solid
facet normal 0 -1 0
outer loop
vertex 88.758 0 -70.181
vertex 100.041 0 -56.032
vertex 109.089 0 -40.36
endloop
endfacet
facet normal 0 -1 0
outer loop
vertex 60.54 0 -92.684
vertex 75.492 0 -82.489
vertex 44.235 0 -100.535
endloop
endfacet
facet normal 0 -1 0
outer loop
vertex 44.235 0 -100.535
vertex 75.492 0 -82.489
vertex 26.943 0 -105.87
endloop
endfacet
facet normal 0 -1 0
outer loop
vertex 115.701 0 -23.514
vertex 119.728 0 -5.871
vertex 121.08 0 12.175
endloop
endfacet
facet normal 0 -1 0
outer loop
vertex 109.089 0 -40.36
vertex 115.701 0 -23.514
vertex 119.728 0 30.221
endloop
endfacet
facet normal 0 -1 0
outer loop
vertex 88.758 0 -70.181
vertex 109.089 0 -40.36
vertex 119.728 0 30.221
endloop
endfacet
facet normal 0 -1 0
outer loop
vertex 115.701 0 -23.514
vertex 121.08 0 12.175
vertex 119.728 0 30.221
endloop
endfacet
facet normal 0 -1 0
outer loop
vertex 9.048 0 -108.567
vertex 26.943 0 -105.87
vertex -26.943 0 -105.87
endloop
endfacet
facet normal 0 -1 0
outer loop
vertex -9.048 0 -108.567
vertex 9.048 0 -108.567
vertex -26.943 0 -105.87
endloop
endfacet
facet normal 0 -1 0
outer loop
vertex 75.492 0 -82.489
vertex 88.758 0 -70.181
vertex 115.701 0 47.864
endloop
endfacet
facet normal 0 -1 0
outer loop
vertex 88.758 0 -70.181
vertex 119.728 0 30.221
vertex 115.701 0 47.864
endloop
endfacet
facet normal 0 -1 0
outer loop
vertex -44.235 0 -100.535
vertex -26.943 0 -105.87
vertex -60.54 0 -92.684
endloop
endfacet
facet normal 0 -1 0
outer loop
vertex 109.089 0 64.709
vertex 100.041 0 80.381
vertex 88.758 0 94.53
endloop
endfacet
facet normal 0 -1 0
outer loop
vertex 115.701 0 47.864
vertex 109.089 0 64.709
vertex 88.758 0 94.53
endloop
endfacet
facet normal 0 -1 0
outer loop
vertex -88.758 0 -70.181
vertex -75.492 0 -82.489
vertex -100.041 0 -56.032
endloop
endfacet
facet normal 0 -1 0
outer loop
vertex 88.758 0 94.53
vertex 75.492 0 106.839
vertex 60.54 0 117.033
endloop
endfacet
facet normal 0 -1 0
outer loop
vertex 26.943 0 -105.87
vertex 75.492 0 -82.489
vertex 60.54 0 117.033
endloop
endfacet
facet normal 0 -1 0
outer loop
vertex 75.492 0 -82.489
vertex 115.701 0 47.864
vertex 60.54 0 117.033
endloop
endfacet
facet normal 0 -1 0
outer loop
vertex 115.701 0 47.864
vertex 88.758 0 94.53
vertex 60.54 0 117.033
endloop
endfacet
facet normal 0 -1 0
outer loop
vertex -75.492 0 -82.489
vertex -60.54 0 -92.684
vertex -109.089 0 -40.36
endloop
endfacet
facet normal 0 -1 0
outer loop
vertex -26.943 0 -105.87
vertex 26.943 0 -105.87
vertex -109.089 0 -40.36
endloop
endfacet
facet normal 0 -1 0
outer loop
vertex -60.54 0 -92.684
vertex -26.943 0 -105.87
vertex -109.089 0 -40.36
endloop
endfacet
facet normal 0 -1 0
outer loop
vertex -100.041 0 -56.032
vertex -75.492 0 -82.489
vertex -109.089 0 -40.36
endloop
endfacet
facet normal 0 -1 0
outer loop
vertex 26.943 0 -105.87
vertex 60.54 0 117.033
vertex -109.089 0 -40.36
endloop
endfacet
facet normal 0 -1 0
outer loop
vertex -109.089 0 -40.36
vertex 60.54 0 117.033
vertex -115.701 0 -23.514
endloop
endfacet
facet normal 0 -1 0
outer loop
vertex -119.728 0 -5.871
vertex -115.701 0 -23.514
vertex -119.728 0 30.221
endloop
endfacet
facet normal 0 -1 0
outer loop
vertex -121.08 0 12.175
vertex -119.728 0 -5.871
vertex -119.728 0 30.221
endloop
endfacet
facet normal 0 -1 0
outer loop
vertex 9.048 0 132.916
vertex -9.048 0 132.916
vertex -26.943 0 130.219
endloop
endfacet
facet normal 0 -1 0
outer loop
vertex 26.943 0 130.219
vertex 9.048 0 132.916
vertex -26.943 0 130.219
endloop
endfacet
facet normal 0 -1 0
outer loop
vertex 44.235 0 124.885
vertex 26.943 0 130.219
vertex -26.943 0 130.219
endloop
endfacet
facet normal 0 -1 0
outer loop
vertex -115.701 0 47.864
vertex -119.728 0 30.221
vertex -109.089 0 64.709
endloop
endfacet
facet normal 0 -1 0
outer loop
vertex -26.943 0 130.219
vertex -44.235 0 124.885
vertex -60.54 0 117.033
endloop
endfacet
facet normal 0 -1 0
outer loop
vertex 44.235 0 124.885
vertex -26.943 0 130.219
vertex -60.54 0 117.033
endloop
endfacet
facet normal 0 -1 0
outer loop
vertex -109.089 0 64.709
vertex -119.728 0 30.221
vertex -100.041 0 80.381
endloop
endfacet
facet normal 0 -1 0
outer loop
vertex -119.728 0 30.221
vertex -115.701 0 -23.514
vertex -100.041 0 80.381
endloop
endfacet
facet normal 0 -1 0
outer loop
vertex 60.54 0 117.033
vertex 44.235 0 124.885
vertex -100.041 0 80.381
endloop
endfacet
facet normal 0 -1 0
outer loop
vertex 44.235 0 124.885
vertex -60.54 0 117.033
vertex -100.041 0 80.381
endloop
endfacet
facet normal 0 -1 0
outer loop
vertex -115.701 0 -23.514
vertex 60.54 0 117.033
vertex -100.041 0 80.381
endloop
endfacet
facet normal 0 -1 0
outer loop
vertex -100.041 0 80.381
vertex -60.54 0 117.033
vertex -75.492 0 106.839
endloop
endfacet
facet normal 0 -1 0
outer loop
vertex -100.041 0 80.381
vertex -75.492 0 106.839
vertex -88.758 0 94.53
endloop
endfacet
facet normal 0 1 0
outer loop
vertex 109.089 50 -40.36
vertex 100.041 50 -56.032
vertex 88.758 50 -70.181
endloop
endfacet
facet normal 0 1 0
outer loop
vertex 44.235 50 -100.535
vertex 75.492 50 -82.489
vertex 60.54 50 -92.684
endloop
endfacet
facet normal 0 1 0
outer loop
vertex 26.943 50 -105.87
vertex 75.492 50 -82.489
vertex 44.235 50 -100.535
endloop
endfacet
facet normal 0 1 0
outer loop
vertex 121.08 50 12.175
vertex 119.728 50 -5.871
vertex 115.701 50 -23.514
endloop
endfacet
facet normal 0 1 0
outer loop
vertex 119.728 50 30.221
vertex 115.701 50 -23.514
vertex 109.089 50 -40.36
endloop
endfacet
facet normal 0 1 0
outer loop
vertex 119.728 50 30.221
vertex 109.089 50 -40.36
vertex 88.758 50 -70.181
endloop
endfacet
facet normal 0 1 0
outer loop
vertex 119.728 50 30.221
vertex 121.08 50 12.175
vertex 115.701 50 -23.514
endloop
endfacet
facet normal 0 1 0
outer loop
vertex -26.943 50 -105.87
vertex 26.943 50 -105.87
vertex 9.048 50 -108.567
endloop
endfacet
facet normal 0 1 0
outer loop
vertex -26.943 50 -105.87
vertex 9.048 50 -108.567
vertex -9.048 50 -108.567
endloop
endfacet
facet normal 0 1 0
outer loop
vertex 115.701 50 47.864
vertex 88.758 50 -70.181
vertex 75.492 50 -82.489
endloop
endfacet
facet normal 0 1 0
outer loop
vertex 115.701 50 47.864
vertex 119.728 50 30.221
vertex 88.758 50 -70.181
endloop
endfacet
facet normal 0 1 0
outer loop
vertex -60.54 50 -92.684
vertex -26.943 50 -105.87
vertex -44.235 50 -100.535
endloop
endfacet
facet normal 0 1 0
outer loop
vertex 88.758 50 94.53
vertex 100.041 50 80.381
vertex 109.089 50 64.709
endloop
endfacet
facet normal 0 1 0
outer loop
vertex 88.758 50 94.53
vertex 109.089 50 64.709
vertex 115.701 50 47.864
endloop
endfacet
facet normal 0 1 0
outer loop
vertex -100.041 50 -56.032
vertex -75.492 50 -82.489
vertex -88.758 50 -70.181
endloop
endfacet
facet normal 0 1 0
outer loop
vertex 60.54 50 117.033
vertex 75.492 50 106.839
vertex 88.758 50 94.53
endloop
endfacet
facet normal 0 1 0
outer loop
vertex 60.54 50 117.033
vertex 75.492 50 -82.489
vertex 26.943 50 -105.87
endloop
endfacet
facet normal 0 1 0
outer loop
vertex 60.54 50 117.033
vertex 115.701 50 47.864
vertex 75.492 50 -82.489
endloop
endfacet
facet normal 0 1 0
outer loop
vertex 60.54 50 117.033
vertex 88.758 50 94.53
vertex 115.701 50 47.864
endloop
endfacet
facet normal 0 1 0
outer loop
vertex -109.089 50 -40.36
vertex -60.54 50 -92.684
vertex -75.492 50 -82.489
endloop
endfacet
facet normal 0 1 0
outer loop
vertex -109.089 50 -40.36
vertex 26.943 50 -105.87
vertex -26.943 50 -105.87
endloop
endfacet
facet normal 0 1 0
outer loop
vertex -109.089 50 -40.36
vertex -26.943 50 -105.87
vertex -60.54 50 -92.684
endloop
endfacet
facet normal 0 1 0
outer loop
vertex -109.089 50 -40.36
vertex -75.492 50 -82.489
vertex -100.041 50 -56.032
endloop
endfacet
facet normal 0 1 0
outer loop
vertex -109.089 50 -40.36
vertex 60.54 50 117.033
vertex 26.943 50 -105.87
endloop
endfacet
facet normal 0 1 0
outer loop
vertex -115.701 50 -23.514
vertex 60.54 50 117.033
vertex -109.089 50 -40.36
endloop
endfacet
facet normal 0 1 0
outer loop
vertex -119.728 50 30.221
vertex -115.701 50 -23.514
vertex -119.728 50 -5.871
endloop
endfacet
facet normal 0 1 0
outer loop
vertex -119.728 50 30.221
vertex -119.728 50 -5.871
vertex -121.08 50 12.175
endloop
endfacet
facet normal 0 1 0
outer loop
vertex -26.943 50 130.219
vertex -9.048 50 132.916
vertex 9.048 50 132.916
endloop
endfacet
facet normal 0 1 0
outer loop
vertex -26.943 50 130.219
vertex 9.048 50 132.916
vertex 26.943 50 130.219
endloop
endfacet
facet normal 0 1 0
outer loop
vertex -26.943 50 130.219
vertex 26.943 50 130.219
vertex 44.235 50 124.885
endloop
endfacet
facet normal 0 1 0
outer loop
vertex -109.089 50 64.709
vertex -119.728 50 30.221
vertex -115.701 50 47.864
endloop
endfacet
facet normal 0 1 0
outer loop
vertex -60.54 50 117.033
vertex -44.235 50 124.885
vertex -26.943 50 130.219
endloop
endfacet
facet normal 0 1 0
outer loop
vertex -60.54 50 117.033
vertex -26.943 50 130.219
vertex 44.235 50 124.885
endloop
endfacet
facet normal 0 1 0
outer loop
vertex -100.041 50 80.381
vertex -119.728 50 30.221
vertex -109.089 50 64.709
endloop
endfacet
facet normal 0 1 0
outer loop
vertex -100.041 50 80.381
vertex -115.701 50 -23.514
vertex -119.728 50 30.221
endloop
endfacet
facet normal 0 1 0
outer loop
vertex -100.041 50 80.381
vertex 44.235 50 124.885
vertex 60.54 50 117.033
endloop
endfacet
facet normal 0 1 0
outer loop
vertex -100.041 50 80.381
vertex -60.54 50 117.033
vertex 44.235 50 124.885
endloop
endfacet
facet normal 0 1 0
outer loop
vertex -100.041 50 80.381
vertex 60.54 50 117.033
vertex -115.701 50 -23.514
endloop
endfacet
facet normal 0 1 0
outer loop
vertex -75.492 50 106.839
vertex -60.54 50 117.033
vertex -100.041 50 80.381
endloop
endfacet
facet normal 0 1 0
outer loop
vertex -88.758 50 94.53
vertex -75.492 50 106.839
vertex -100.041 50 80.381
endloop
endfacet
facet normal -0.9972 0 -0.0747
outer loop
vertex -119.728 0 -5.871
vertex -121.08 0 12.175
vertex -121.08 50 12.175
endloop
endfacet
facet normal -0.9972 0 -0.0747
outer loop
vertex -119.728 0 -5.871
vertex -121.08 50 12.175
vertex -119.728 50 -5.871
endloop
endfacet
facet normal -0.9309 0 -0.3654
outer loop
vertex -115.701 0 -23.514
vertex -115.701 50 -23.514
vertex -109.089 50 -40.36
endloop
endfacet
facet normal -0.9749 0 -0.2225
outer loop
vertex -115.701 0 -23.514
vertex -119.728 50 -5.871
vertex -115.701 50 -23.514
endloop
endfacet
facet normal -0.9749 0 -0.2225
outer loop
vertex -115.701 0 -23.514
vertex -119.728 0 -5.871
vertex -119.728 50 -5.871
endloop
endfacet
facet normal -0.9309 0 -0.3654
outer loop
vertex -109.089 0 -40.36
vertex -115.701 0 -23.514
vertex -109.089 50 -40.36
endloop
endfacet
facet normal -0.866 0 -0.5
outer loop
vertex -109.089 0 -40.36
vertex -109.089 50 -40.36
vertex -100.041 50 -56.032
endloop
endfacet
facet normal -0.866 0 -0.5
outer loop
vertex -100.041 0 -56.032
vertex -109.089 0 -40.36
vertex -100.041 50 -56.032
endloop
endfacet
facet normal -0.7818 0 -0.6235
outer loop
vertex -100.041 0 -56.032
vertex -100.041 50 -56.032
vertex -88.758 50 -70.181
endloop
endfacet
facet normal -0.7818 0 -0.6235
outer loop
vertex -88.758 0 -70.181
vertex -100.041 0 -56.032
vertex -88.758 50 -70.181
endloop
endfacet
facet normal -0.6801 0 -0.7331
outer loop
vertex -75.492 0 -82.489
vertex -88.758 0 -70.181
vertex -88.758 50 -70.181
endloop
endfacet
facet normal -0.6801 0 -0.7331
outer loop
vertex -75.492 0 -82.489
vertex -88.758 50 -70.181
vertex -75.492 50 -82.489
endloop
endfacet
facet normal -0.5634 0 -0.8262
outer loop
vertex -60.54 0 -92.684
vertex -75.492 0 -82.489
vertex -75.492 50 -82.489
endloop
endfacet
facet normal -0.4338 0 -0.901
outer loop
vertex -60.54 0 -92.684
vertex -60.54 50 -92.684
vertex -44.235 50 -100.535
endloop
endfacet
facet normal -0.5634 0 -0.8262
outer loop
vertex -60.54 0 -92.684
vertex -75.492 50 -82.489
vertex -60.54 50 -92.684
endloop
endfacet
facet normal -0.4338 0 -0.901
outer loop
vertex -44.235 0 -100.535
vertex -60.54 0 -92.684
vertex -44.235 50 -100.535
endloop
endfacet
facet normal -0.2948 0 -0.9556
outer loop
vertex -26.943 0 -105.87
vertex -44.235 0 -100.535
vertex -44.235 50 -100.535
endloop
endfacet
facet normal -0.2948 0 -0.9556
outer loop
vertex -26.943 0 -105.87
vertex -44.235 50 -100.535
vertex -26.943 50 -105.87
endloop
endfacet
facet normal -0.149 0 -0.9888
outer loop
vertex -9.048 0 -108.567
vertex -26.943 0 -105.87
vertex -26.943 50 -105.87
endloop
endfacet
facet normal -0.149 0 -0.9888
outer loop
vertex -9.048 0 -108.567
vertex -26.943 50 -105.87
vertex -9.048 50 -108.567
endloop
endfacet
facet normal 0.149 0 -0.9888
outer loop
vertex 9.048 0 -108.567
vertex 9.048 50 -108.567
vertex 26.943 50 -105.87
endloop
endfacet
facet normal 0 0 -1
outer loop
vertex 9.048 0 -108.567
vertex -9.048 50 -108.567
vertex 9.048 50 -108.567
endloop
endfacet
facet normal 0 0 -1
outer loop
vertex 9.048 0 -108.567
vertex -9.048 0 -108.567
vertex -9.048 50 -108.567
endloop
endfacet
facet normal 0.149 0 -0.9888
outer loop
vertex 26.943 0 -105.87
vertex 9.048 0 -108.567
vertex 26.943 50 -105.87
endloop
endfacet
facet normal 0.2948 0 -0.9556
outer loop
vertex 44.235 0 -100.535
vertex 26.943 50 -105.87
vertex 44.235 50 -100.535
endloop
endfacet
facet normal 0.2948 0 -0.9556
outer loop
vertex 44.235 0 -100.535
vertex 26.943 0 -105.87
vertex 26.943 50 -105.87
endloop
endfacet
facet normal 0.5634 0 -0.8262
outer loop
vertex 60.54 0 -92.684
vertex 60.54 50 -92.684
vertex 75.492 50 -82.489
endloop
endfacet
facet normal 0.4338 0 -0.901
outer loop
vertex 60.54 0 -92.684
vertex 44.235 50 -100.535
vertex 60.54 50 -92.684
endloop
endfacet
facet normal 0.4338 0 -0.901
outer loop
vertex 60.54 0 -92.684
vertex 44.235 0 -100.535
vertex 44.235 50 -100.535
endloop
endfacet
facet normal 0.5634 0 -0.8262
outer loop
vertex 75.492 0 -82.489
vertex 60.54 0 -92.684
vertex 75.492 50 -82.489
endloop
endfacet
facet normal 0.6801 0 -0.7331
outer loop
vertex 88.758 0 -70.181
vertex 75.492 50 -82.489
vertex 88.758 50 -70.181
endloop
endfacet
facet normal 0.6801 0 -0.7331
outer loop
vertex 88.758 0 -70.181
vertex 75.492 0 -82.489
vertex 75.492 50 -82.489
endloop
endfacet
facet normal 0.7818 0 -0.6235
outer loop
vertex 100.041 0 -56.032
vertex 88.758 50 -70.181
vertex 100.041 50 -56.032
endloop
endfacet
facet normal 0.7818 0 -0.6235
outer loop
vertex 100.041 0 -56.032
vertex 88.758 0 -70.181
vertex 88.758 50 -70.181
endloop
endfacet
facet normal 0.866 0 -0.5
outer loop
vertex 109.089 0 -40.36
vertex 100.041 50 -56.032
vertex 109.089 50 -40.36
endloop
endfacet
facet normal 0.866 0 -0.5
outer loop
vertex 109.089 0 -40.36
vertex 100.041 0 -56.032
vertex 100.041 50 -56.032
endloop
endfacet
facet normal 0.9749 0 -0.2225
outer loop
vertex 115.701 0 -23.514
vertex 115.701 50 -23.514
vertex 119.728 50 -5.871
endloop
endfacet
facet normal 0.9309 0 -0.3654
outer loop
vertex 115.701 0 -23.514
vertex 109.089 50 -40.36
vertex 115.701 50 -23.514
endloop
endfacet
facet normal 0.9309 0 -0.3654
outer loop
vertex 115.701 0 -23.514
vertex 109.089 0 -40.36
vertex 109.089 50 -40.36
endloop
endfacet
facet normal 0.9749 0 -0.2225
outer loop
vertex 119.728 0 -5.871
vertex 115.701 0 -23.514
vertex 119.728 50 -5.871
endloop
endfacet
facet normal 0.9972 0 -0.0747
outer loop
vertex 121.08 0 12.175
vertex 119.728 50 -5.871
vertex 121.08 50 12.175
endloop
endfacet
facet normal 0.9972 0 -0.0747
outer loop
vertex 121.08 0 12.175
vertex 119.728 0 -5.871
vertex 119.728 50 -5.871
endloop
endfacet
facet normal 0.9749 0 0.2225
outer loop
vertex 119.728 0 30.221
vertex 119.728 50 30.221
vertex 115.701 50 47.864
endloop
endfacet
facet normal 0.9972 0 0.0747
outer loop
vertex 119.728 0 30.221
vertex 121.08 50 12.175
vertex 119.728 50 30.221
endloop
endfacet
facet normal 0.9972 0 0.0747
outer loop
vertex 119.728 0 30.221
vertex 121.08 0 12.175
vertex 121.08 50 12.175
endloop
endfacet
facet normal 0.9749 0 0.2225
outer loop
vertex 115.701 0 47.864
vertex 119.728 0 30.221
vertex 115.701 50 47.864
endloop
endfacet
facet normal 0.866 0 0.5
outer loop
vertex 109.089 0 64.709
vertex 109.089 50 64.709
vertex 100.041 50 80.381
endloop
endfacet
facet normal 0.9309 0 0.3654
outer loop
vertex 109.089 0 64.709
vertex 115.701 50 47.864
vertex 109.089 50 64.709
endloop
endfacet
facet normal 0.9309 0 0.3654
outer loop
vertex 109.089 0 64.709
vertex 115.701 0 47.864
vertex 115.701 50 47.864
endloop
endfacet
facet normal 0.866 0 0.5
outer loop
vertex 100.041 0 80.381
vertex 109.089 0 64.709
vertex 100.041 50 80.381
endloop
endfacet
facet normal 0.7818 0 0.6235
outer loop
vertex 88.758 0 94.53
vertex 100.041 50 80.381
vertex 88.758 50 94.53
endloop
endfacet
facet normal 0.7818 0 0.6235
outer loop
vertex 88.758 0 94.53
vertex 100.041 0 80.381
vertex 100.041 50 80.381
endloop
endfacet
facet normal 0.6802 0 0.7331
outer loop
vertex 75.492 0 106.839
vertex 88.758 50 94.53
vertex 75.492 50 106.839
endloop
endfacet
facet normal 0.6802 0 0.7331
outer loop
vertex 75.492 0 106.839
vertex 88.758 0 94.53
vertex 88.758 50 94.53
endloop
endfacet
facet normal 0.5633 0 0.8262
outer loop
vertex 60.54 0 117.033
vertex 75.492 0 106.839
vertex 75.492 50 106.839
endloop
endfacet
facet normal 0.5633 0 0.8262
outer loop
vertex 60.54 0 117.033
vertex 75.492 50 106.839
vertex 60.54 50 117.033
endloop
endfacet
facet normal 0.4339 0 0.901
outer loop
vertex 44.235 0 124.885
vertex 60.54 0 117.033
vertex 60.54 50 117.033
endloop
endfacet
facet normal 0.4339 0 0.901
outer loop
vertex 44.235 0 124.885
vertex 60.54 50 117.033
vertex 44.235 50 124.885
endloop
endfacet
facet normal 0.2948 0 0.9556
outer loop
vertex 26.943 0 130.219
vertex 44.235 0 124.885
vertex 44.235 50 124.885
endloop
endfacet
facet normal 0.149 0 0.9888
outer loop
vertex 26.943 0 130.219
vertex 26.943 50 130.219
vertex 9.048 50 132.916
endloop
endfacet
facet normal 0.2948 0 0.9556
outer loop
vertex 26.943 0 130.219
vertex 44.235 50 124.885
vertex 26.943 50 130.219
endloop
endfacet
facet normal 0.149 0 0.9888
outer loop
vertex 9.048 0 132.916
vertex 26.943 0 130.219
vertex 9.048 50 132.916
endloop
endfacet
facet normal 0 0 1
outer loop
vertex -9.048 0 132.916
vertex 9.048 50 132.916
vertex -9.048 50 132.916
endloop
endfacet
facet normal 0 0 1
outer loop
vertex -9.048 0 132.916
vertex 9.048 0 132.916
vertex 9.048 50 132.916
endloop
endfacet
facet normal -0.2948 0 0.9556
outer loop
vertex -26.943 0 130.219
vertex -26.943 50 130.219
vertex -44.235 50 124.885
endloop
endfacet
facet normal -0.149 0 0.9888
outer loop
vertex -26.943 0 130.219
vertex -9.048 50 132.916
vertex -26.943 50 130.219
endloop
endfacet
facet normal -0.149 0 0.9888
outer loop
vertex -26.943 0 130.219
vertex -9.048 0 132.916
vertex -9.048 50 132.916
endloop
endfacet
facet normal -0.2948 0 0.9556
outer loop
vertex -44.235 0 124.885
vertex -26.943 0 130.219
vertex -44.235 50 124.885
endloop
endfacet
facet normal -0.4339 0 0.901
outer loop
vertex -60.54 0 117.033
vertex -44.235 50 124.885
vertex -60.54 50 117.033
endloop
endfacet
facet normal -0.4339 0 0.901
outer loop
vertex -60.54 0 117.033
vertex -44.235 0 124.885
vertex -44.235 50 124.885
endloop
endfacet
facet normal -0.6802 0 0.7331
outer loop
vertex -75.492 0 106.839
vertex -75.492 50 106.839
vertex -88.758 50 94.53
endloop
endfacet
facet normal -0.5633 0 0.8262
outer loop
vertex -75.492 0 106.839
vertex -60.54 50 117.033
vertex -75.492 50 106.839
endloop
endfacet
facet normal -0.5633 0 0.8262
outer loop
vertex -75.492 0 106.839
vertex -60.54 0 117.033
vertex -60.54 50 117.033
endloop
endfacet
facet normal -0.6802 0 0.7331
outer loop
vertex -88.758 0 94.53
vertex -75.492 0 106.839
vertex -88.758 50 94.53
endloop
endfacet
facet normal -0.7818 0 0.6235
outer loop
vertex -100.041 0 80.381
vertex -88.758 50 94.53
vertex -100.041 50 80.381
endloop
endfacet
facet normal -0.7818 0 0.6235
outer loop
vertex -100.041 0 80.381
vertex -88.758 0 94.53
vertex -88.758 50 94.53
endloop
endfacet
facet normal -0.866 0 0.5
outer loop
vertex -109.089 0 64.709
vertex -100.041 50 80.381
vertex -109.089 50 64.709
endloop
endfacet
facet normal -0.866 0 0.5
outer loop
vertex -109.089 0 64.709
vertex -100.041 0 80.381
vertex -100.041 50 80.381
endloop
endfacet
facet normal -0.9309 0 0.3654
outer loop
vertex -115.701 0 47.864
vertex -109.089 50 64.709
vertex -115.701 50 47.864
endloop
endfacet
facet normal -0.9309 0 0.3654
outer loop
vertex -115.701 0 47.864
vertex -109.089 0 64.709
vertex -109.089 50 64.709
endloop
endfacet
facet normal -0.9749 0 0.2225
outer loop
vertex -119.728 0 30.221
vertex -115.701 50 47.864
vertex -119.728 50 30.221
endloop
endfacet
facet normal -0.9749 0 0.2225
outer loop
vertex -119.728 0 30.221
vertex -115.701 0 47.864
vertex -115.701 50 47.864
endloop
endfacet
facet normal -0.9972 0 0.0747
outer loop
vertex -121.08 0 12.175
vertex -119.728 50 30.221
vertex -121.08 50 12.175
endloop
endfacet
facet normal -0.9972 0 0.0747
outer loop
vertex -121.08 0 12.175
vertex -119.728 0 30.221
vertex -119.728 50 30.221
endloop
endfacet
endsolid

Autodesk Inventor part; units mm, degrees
ref_plane "YZ Plane" through (0, 0, 0) normal (1, 0, 0) x (0, 1, 0)
ref_plane "XZ Plane" through (0, 0, 0) normal (0, 1, 0) x (-1, 0, 0)
ref_plane "XY Plane" through (0, 0, 0) normal (0, 0, 1) x (1, 0, 0)
sketch "Sketch1" plane through (0, 0, 0) normal (0, 1, 0) x (-1, 0, 0)
  circle A0 centre (0, 12.1747) radius 12.108
  arc A1 (7.1431, 10.8771) -> (-7.6488, 10.8771) centre (-0.2529, 11.8554) ccw
  point P0 (0, 0)
extrude "Extrusion1" add sketch "Sketch1" along normal blind 5
sketch "Sketch2" plane through (0, 0, 12.1747) normal (0, -1, 0) x (1, 0, 0)
  point P0 (0, -12.1747)
sketch "Sketch3" plane through (0, 5, 12.1747) normal (0, 1, 0) x (1, 0, 0)
  point P0 (0, 12.1747)
sketch "Sketch4" plane through (0, 0, 0) normal (0, 1, 0) x (-1, 0, 0)
  arc A0 (2.5285, 18.8375) -> (2.5917, 4.9938) centre (-0.8103, 11.9003) ccw
  point P0 (0, 0)
scale "Scale1" factors (5, 5, 5) then translate (0, 0, -48.6988) bodies 1
scale "Scale2" factors (2, 2, 2) then translate (0, 0, -12.1747) bodies 1
properties part number "drum"
